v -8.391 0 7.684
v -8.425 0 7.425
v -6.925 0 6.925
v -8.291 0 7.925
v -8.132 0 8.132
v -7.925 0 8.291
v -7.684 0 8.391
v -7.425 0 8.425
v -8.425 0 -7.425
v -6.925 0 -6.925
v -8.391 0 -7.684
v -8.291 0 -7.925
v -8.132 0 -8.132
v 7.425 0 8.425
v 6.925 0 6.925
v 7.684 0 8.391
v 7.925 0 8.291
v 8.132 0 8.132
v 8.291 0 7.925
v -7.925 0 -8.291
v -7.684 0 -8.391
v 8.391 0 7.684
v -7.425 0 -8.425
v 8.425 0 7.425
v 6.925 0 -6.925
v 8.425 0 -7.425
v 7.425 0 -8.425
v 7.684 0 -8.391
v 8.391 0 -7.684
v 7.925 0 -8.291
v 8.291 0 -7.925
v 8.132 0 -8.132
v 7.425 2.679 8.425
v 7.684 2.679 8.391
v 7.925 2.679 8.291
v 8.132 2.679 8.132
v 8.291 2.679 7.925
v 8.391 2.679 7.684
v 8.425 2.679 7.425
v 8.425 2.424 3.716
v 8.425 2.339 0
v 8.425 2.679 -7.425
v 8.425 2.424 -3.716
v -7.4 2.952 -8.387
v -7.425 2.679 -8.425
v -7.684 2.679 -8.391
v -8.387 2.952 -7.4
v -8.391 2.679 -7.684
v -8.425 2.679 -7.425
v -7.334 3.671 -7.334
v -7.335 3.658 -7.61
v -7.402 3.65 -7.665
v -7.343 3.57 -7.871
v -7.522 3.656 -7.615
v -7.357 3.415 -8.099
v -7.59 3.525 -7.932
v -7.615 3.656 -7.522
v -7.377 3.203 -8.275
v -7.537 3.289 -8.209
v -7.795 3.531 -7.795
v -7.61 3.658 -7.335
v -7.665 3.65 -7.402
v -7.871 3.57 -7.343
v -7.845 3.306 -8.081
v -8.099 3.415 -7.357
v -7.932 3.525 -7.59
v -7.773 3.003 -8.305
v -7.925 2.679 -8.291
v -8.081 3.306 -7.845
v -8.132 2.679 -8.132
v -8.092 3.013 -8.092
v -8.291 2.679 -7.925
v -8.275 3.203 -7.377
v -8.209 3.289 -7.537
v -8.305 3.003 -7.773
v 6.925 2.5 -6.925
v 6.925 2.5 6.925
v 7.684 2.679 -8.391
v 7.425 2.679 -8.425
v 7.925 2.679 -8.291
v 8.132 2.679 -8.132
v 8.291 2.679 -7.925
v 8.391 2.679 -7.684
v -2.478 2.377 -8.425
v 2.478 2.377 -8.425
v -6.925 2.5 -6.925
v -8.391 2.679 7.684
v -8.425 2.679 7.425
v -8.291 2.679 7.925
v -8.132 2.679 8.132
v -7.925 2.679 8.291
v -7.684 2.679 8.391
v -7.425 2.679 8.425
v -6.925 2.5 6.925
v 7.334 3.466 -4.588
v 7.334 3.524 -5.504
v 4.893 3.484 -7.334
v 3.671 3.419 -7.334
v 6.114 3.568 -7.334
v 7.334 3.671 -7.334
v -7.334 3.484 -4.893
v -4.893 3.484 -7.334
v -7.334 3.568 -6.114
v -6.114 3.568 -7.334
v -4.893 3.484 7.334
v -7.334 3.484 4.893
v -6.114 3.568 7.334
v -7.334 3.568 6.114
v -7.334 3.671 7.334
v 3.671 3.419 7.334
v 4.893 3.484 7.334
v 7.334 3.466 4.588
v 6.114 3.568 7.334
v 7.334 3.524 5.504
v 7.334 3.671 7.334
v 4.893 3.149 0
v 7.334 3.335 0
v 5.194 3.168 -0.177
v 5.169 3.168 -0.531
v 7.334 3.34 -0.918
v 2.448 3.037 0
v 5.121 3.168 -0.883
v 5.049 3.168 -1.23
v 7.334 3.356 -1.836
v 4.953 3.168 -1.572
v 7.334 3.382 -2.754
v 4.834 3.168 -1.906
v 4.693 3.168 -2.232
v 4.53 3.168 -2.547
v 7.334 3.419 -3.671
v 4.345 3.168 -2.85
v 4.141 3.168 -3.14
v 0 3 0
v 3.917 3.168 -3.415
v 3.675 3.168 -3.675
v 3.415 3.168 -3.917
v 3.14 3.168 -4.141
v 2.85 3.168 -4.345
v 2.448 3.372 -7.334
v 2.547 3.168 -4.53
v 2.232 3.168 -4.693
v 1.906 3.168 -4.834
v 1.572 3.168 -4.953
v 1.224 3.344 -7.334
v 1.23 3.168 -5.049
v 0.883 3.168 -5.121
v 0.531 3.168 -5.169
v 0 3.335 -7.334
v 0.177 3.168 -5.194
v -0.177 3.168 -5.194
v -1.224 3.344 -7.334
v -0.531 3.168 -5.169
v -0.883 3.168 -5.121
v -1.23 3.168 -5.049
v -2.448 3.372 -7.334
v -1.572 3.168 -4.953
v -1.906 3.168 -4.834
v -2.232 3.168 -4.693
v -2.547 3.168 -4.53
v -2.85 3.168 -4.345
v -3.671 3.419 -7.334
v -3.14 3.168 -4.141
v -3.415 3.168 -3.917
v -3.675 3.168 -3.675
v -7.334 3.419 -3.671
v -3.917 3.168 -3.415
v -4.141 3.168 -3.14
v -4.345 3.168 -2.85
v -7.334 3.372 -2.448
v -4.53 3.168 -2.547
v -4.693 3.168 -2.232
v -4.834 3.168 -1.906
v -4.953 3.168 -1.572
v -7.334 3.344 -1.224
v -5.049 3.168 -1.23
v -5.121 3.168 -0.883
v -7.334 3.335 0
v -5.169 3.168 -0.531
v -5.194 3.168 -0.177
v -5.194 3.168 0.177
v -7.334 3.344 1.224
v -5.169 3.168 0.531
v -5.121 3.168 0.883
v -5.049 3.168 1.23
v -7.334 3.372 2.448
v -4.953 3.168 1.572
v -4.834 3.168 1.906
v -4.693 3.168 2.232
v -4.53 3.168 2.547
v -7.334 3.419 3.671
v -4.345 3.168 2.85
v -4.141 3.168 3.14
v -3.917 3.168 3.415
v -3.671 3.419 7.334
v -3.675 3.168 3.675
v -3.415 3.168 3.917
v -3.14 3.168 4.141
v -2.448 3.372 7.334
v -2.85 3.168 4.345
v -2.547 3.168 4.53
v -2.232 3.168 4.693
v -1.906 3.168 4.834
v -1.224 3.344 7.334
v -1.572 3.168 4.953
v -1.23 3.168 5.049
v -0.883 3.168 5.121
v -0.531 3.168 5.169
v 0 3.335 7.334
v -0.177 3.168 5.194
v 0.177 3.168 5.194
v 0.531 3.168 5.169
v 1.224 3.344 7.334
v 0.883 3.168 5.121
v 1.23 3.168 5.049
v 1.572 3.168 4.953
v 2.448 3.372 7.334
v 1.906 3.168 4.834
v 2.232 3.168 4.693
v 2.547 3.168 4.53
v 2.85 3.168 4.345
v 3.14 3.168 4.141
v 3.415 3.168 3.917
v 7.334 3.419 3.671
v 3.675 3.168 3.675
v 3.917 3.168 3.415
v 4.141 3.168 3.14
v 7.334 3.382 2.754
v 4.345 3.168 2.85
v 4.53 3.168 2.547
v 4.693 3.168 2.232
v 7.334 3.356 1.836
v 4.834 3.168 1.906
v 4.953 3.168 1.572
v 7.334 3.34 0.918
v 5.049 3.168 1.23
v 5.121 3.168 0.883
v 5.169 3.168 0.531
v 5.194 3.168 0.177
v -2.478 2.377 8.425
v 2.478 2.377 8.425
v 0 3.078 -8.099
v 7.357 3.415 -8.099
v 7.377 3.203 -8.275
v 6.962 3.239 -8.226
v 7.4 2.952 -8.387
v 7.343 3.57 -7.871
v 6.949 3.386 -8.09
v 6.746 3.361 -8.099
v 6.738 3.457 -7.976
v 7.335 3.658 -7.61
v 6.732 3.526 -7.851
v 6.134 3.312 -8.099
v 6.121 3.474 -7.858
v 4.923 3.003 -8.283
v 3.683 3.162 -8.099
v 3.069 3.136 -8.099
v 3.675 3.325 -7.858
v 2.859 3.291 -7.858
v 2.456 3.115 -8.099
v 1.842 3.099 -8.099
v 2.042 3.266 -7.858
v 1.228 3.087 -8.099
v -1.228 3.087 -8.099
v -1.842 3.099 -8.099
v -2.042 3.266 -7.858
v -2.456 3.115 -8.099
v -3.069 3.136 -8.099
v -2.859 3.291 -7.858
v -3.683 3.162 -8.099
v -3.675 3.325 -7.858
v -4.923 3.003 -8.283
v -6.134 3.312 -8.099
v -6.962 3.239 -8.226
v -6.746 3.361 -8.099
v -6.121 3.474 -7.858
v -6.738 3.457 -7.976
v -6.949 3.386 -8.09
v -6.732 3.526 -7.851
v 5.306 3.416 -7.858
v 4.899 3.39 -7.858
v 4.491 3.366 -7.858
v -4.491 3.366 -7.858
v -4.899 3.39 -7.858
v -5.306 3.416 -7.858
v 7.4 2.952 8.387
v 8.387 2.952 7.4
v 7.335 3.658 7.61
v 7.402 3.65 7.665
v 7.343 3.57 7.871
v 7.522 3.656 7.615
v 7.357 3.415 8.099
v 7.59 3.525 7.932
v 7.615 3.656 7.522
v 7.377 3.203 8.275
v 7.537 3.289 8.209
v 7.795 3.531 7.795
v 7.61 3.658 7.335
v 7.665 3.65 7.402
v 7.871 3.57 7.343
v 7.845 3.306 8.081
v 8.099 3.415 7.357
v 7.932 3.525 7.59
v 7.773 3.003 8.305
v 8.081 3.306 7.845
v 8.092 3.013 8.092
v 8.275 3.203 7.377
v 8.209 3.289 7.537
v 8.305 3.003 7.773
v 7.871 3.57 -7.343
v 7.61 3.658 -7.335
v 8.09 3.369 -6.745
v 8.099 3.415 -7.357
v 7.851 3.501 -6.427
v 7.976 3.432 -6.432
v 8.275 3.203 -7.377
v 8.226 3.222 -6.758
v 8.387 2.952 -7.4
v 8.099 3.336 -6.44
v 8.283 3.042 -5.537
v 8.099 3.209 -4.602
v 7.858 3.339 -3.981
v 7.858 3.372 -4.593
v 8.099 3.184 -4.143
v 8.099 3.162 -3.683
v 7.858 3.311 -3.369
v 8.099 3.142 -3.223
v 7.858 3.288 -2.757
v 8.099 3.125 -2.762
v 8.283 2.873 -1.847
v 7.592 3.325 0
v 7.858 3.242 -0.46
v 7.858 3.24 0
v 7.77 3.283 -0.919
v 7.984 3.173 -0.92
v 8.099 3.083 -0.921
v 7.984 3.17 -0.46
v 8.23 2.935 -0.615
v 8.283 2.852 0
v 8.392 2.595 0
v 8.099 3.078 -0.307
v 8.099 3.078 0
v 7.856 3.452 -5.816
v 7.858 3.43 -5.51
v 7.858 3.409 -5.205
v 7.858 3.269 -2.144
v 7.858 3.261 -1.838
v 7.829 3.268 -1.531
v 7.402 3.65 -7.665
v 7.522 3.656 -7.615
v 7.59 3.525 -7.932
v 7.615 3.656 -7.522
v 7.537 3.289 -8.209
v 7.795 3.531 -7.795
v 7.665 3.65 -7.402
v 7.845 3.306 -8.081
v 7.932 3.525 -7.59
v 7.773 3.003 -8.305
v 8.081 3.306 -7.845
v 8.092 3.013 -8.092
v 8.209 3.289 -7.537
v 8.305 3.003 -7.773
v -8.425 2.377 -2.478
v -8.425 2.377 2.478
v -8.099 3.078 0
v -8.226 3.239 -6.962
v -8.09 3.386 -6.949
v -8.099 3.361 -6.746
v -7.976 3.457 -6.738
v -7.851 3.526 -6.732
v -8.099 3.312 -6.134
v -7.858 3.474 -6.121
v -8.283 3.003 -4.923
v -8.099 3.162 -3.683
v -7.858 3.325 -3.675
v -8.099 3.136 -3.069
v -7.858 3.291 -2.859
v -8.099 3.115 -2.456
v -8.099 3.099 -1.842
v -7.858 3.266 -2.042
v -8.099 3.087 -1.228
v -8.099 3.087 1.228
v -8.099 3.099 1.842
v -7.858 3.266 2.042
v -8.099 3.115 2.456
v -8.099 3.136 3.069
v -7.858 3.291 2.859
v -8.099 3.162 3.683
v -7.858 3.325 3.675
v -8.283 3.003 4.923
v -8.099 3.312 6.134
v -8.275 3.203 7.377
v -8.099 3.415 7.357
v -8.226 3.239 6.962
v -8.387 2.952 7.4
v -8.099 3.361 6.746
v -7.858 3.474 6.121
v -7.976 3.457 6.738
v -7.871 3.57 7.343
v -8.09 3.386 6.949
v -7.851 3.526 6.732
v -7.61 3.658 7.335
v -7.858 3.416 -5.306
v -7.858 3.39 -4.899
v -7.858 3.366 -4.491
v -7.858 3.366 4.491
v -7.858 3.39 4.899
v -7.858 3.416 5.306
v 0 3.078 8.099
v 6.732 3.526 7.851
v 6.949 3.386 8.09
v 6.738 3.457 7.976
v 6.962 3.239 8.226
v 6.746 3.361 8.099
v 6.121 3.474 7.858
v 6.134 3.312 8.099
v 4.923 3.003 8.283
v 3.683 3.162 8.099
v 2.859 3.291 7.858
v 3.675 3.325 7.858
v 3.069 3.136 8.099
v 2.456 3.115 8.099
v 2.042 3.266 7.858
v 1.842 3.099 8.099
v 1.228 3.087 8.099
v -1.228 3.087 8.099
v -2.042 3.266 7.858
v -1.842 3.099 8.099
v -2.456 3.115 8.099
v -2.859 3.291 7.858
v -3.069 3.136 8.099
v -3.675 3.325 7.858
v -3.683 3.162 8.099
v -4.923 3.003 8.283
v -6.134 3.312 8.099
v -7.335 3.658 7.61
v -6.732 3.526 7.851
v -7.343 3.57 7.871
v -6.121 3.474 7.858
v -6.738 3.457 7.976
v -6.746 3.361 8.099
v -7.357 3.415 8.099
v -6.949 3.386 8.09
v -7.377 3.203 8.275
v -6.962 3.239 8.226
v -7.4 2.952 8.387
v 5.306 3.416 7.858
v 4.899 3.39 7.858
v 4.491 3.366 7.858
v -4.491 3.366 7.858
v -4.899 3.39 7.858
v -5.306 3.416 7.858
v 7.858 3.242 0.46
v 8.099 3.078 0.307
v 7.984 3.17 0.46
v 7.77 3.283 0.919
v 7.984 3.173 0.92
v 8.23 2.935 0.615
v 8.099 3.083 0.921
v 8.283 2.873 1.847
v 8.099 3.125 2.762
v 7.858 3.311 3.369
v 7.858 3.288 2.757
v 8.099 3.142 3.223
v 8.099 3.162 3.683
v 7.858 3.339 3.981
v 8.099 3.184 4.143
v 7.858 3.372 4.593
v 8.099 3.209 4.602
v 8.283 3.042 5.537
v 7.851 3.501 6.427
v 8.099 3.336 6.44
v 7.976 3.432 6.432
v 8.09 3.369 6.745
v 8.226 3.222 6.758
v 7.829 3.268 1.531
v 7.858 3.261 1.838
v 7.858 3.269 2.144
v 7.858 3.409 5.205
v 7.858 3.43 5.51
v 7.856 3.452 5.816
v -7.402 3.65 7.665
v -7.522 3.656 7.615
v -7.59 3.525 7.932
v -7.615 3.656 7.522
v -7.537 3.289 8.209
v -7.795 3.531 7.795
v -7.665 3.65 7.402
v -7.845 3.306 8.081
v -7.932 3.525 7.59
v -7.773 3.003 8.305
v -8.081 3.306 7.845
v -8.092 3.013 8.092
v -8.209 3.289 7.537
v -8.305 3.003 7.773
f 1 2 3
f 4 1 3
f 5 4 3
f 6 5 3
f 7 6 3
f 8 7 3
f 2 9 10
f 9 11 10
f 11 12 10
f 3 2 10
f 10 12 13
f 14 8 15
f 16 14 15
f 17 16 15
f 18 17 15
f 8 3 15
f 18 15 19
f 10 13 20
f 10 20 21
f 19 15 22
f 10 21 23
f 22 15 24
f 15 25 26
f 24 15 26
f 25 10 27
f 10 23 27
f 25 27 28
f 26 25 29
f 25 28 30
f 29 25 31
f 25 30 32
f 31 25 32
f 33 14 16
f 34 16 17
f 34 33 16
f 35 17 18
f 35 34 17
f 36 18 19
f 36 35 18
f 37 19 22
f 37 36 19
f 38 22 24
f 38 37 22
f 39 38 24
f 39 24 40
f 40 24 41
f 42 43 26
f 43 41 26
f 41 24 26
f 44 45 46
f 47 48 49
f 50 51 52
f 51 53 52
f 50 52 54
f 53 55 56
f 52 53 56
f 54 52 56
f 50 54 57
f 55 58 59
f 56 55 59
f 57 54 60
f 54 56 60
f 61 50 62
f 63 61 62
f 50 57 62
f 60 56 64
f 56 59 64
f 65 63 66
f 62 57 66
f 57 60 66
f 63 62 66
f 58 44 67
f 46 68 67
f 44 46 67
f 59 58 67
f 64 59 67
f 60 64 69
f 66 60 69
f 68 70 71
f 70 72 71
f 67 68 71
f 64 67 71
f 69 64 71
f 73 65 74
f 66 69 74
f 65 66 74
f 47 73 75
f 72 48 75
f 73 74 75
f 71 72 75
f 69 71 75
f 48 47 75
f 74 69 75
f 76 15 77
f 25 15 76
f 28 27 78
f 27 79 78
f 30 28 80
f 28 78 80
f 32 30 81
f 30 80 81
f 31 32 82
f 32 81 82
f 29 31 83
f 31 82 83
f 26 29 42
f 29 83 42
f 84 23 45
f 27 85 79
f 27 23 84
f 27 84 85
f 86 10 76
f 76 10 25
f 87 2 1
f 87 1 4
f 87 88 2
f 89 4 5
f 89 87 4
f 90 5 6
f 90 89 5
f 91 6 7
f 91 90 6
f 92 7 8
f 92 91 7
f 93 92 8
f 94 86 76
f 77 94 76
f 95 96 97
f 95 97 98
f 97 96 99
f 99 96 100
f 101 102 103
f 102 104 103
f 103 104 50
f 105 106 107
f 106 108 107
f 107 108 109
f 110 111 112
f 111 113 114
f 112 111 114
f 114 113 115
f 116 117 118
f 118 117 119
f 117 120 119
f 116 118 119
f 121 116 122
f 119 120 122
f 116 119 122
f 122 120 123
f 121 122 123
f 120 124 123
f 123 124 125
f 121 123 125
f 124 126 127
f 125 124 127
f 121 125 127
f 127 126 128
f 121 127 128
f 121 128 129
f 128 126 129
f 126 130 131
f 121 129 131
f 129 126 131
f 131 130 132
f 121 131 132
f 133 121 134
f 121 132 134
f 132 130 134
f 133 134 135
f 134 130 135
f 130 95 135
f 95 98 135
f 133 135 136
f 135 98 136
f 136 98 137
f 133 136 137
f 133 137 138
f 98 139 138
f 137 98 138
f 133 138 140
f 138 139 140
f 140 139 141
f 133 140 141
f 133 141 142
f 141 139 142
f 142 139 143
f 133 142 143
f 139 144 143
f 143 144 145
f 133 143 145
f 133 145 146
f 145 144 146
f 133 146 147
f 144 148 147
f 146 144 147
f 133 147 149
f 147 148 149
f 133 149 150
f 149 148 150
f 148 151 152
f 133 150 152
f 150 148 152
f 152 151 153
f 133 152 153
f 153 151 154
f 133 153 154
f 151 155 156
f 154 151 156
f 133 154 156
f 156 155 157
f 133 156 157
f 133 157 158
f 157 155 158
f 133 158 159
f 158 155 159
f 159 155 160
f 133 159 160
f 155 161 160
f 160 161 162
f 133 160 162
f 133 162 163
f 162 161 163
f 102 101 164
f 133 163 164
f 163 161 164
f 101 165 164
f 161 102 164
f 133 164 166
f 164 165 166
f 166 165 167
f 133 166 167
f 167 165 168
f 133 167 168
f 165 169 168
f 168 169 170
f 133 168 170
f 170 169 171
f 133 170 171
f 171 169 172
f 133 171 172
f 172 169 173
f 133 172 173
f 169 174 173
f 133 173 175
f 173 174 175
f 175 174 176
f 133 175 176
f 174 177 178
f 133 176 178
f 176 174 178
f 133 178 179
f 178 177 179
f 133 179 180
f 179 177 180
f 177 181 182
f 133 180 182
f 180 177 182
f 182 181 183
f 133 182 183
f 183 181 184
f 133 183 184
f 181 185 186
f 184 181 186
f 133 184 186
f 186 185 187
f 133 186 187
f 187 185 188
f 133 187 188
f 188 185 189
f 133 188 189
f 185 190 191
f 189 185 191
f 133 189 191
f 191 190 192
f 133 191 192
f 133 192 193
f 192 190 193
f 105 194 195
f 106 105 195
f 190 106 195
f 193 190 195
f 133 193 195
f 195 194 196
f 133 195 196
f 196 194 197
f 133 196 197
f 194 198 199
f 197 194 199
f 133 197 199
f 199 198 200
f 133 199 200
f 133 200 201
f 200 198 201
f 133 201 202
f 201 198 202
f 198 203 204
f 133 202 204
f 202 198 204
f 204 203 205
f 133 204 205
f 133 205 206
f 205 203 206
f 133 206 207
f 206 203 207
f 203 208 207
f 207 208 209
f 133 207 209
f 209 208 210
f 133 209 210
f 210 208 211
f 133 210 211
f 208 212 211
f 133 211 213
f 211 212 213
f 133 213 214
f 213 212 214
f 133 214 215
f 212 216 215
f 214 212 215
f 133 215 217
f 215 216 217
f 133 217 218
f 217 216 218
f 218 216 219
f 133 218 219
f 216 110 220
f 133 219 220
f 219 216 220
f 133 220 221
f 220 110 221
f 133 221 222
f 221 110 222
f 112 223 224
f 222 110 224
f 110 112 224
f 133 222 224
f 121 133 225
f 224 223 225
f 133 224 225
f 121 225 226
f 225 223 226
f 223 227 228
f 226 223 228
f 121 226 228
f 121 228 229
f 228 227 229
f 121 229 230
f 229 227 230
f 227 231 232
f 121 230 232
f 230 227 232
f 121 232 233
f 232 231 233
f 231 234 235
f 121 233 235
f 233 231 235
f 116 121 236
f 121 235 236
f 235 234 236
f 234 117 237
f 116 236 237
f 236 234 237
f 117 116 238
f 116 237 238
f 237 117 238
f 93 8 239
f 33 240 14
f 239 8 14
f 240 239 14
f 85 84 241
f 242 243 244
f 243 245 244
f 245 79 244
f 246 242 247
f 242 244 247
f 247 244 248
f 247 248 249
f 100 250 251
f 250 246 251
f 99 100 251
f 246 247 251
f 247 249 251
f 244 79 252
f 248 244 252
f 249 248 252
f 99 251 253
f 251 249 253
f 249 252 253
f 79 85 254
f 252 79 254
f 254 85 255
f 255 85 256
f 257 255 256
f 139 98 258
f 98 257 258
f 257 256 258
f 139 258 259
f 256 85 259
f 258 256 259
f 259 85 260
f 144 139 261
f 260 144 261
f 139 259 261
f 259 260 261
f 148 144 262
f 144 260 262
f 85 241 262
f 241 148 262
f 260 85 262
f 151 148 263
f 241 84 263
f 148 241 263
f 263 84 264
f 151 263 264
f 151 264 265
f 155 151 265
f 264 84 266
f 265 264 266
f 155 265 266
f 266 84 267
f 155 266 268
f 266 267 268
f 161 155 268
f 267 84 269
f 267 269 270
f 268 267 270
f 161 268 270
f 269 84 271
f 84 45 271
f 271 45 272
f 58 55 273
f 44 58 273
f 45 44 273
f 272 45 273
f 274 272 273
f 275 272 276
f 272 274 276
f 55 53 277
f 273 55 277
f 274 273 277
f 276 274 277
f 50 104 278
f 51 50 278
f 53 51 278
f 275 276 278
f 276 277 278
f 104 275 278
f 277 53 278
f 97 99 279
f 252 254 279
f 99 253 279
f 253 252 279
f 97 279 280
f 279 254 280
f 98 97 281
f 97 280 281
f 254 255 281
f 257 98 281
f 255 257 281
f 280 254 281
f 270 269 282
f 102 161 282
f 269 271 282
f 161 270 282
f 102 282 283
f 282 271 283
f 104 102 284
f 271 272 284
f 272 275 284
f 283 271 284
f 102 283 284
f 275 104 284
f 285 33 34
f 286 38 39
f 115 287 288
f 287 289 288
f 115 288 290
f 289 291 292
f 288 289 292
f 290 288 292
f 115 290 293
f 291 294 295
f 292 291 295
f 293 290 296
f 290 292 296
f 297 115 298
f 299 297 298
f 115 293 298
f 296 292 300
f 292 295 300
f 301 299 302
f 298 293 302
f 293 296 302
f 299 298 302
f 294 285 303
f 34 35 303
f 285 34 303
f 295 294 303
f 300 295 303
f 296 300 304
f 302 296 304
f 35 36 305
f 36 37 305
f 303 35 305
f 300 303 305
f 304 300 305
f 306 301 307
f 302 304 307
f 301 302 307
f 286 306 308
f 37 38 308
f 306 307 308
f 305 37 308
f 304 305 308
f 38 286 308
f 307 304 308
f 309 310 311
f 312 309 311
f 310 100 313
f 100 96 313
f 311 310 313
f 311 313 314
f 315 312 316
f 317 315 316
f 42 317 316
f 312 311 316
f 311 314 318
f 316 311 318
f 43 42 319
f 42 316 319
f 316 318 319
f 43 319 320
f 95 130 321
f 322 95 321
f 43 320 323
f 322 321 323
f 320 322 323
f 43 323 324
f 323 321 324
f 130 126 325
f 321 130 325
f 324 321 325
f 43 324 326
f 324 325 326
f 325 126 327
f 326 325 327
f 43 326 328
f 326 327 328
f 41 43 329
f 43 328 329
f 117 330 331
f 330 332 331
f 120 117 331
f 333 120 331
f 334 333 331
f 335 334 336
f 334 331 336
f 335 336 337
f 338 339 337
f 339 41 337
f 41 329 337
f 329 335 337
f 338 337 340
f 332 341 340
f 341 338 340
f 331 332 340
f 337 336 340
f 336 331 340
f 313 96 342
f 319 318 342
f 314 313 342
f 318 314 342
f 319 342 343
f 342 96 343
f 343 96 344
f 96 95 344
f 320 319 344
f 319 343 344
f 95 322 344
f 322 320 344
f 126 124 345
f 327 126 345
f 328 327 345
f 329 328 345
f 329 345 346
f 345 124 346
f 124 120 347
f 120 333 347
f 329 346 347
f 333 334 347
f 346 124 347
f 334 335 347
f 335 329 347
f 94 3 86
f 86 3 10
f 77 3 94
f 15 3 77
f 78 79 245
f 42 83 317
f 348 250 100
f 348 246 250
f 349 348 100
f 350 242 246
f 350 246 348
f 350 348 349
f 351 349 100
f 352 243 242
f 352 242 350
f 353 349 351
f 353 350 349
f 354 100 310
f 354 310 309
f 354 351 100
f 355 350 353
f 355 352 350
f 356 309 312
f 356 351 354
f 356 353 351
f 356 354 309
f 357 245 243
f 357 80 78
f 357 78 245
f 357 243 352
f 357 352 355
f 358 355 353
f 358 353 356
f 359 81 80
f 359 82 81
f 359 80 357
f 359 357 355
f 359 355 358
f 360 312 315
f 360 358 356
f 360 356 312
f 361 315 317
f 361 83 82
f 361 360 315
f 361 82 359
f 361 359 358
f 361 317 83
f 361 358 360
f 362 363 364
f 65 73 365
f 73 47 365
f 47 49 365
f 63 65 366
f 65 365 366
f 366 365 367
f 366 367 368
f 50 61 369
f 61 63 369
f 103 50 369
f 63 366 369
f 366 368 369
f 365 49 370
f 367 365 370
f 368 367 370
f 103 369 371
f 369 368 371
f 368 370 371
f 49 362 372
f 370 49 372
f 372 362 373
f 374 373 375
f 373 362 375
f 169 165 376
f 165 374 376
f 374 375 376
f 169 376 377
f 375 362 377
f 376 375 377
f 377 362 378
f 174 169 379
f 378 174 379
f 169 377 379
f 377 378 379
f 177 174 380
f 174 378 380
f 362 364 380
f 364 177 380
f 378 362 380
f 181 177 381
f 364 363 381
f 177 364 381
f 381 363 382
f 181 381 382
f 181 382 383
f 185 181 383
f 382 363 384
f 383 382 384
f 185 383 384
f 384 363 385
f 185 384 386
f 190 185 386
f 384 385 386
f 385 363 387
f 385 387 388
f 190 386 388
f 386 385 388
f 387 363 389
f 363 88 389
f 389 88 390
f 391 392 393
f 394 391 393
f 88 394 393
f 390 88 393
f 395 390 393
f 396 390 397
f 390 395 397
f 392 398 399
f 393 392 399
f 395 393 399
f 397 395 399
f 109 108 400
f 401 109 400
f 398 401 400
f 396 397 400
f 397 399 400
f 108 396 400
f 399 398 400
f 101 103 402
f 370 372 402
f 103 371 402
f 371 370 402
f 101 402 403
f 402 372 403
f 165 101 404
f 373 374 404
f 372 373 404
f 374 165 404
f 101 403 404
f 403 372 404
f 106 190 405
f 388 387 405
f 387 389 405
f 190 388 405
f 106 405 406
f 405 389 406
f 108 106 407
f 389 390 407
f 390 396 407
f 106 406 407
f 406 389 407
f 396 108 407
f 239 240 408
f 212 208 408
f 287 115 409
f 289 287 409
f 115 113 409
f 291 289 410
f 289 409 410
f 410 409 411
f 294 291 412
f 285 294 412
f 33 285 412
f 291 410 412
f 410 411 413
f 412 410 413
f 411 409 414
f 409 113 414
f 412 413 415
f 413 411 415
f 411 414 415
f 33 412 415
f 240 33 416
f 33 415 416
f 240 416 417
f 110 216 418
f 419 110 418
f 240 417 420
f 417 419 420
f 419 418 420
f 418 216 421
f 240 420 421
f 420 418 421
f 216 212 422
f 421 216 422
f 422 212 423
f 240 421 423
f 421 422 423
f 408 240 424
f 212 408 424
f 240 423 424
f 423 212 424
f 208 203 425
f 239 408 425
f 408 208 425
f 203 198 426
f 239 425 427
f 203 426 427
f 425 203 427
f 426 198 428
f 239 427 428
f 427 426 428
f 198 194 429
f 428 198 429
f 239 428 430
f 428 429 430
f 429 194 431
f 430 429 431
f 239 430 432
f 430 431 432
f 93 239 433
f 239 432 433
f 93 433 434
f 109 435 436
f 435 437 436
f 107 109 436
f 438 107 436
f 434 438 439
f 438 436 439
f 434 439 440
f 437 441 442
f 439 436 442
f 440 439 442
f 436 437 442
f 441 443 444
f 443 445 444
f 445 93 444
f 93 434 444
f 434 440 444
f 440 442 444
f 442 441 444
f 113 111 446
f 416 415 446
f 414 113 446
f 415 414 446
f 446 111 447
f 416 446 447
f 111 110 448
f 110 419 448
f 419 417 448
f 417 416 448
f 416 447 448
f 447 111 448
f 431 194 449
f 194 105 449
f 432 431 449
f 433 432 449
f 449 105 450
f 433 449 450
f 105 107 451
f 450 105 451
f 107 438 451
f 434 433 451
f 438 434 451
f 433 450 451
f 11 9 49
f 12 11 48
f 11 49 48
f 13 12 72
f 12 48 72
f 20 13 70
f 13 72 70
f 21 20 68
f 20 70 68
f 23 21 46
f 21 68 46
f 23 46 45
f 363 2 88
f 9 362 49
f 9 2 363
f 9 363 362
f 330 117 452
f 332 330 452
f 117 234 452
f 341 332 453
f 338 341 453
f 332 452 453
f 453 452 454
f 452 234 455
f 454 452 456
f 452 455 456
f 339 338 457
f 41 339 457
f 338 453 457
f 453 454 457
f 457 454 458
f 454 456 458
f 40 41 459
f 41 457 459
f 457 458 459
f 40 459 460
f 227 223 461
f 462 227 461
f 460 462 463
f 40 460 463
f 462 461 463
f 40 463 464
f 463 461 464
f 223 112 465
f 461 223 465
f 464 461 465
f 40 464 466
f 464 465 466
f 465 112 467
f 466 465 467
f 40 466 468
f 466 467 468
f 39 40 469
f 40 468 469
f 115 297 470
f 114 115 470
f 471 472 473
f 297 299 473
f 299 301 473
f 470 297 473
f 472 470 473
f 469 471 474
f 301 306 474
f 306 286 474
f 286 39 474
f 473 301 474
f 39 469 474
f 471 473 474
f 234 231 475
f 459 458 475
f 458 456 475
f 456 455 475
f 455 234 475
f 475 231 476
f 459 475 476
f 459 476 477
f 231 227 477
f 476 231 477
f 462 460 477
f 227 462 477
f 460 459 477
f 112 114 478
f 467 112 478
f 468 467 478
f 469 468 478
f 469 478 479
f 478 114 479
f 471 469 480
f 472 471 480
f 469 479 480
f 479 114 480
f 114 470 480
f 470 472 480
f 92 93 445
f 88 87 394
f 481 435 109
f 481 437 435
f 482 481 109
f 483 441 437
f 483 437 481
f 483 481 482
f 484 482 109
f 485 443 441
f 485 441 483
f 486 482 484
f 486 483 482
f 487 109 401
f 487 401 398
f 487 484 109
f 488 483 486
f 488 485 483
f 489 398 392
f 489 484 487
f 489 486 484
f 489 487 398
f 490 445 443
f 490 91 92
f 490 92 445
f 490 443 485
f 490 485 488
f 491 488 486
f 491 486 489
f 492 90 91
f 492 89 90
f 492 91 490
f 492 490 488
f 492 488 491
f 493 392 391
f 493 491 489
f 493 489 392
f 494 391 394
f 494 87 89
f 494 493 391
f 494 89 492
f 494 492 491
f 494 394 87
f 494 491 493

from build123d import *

# Parameters (mm, degrees)
SKETCH_1_W      = 16.85
SKETCH_1_H      = 16.85
EXTRUDE_1_DEPTH = 4
SHELL_1_T       = -1.5
FILLET_1_R      = 1


with BuildPart() as part:
    # 草图1 → 凸台-拉伸1 (new body)
    with BuildSketch(Plane(origin=(0, 0, 0), x_dir=(1, 0, 0), z_dir=(0, 1, 0))):
        Rectangle(SKETCH_1_W, SKETCH_1_H)
    extrude(amount=EXTRUDE_1_DEPTH)

    # 抽壳1
    shell_1_openings = [part.faces().sort_by_distance(p)[0] for p in [
        (0, 0, 0),
    ]]
    offset(amount=SHELL_1_T, openings=shell_1_openings, kind=Kind.INTERSECTION)

    # 草图2 → 切除-旋转5 (revolve, cut)
    with BuildSketch(Plane.XY):
        with BuildLine():
            Line((0, 164), (0, 3))
            ThreePointArc((0, 3), (80.5, 83.5), (0, 164))
        make_face()
    revolve(axis=Axis((0, 0, 0), (0, 1, 0)), mode=Mode.SUBTRACT)

    # 圆角1
    fillet_1_edges = [part.edges().sort_by_distance(p)[0] for p in [
        (8.425, 1.943314789, 8.425),
        (-8.425, 1.943314789, 8.425),
        (0, 3.442087368, 8.425),
        (-8.425, 1.943314789, -8.425),
        (8.425, 1.943314789, -8.425),
        (0, 3.442087368, -8.425),
        (8.425, 3.553300166, 4.218359953),
        (-8.425, 3.442087368, 0),
    ]]
    fillet(fillet_1_edges, radius=FILLET_1_R)


solid = part.part
